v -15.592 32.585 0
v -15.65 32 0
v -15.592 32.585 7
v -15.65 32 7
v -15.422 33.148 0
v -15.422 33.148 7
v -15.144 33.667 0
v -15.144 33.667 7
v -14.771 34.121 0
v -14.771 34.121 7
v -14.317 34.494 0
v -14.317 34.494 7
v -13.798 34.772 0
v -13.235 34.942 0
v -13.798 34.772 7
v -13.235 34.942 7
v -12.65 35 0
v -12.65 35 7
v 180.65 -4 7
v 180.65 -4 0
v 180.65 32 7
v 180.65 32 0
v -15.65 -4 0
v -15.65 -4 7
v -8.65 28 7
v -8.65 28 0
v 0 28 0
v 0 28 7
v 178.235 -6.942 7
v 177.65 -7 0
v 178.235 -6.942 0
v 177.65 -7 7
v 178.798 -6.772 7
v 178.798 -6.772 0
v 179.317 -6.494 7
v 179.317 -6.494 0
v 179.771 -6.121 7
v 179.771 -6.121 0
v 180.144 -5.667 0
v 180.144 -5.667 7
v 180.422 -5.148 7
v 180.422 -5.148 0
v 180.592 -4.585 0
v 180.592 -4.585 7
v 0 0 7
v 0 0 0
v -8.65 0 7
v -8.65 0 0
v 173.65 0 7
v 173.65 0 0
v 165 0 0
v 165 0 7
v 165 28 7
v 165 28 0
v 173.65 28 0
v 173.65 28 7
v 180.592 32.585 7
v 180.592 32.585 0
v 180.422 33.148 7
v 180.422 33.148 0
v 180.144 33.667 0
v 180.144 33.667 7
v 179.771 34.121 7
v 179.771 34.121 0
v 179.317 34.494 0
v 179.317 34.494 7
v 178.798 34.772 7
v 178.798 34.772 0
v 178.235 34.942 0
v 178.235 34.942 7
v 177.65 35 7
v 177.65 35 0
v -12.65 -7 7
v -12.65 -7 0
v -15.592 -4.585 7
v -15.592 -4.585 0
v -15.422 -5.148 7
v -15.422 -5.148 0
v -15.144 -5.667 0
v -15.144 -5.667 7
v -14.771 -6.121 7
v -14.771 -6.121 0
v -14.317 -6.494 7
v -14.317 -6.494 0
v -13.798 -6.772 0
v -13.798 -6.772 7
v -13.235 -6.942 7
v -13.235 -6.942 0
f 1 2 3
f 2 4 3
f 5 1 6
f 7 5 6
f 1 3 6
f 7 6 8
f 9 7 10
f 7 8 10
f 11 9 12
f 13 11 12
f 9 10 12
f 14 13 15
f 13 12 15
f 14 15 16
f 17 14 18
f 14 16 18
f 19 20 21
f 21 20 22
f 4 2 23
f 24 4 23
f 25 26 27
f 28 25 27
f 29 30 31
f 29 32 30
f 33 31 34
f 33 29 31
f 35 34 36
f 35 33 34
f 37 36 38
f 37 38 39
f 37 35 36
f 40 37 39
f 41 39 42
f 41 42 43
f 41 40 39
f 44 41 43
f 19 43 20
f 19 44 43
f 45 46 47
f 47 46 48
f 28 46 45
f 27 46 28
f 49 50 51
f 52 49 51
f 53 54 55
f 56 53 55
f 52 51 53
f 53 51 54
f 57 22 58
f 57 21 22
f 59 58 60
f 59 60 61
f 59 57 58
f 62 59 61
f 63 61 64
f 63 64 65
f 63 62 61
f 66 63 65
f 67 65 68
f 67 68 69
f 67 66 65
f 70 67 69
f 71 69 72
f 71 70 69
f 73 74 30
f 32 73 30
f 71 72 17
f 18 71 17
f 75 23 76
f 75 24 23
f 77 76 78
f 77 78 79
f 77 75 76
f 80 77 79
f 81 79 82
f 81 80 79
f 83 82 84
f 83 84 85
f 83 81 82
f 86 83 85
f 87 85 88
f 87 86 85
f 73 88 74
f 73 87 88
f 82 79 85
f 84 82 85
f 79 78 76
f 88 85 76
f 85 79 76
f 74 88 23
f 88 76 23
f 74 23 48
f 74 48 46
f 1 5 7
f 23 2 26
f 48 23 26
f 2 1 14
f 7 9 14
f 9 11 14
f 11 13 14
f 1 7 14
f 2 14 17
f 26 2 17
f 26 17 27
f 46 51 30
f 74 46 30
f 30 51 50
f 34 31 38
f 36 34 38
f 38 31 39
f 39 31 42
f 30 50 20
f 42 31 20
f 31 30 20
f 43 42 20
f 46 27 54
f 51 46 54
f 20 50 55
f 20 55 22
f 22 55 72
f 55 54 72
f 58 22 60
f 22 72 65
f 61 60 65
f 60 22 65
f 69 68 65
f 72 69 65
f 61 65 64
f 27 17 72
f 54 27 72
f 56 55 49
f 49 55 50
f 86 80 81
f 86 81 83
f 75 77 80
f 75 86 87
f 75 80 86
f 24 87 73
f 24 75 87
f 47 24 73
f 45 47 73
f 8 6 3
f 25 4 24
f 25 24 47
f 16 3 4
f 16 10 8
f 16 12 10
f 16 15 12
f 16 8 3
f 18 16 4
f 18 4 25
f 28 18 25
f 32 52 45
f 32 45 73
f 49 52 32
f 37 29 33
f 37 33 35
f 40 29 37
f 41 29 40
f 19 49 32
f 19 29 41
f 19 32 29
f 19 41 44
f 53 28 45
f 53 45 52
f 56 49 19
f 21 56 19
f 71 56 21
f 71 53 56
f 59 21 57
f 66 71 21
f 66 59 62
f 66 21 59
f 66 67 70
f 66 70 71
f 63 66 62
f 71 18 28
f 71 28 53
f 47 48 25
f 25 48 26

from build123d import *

# Parameters (mm, degrees)
F0_W     = 165
F0_H     = 28
F1_DEPTH = 7
F2_R     = 3


with BuildPart() as f1:
    # F0 (on Top) → F1 (new body)
    with BuildSketch(Plane.XY):
        Polygon((-8.65, 28), (0, 28), (165, 28), (173.65, 28), (173.65, 35), (-8.65, 35), align=None)
        Polygon((-15.65, 0), (-8.65, 0), (-8.65, 28), (-8.65, 35), (-15.65, 35), align=None)
        Polygon((165, 0), (0, 0), (-8.65, 0), (-15.65, 0), (-15.65, -7), (173.65, -7), (173.65, 0), align=None)
        with Locations((82.5, 14)):
            Rectangle(F0_W, F0_H)
        Polygon((173.65, 28), (173.65, 0), (173.65, -7), (180.65, -7), (180.65, 35), (173.65, 35), align=None)
    extrude(amount=F1_DEPTH)

    # F2
    f2_edges = [f1.edges().sort_by_distance(p)[0] for p in [
        (180.65, -7, 3.5),
        (180.65, 35, 3.5),
        (-15.65, -7, 3.5),
        (-15.65, 35, 3.5),
    ]]
    fillet(f2_edges, radius=F2_R)


solid = f1.part
